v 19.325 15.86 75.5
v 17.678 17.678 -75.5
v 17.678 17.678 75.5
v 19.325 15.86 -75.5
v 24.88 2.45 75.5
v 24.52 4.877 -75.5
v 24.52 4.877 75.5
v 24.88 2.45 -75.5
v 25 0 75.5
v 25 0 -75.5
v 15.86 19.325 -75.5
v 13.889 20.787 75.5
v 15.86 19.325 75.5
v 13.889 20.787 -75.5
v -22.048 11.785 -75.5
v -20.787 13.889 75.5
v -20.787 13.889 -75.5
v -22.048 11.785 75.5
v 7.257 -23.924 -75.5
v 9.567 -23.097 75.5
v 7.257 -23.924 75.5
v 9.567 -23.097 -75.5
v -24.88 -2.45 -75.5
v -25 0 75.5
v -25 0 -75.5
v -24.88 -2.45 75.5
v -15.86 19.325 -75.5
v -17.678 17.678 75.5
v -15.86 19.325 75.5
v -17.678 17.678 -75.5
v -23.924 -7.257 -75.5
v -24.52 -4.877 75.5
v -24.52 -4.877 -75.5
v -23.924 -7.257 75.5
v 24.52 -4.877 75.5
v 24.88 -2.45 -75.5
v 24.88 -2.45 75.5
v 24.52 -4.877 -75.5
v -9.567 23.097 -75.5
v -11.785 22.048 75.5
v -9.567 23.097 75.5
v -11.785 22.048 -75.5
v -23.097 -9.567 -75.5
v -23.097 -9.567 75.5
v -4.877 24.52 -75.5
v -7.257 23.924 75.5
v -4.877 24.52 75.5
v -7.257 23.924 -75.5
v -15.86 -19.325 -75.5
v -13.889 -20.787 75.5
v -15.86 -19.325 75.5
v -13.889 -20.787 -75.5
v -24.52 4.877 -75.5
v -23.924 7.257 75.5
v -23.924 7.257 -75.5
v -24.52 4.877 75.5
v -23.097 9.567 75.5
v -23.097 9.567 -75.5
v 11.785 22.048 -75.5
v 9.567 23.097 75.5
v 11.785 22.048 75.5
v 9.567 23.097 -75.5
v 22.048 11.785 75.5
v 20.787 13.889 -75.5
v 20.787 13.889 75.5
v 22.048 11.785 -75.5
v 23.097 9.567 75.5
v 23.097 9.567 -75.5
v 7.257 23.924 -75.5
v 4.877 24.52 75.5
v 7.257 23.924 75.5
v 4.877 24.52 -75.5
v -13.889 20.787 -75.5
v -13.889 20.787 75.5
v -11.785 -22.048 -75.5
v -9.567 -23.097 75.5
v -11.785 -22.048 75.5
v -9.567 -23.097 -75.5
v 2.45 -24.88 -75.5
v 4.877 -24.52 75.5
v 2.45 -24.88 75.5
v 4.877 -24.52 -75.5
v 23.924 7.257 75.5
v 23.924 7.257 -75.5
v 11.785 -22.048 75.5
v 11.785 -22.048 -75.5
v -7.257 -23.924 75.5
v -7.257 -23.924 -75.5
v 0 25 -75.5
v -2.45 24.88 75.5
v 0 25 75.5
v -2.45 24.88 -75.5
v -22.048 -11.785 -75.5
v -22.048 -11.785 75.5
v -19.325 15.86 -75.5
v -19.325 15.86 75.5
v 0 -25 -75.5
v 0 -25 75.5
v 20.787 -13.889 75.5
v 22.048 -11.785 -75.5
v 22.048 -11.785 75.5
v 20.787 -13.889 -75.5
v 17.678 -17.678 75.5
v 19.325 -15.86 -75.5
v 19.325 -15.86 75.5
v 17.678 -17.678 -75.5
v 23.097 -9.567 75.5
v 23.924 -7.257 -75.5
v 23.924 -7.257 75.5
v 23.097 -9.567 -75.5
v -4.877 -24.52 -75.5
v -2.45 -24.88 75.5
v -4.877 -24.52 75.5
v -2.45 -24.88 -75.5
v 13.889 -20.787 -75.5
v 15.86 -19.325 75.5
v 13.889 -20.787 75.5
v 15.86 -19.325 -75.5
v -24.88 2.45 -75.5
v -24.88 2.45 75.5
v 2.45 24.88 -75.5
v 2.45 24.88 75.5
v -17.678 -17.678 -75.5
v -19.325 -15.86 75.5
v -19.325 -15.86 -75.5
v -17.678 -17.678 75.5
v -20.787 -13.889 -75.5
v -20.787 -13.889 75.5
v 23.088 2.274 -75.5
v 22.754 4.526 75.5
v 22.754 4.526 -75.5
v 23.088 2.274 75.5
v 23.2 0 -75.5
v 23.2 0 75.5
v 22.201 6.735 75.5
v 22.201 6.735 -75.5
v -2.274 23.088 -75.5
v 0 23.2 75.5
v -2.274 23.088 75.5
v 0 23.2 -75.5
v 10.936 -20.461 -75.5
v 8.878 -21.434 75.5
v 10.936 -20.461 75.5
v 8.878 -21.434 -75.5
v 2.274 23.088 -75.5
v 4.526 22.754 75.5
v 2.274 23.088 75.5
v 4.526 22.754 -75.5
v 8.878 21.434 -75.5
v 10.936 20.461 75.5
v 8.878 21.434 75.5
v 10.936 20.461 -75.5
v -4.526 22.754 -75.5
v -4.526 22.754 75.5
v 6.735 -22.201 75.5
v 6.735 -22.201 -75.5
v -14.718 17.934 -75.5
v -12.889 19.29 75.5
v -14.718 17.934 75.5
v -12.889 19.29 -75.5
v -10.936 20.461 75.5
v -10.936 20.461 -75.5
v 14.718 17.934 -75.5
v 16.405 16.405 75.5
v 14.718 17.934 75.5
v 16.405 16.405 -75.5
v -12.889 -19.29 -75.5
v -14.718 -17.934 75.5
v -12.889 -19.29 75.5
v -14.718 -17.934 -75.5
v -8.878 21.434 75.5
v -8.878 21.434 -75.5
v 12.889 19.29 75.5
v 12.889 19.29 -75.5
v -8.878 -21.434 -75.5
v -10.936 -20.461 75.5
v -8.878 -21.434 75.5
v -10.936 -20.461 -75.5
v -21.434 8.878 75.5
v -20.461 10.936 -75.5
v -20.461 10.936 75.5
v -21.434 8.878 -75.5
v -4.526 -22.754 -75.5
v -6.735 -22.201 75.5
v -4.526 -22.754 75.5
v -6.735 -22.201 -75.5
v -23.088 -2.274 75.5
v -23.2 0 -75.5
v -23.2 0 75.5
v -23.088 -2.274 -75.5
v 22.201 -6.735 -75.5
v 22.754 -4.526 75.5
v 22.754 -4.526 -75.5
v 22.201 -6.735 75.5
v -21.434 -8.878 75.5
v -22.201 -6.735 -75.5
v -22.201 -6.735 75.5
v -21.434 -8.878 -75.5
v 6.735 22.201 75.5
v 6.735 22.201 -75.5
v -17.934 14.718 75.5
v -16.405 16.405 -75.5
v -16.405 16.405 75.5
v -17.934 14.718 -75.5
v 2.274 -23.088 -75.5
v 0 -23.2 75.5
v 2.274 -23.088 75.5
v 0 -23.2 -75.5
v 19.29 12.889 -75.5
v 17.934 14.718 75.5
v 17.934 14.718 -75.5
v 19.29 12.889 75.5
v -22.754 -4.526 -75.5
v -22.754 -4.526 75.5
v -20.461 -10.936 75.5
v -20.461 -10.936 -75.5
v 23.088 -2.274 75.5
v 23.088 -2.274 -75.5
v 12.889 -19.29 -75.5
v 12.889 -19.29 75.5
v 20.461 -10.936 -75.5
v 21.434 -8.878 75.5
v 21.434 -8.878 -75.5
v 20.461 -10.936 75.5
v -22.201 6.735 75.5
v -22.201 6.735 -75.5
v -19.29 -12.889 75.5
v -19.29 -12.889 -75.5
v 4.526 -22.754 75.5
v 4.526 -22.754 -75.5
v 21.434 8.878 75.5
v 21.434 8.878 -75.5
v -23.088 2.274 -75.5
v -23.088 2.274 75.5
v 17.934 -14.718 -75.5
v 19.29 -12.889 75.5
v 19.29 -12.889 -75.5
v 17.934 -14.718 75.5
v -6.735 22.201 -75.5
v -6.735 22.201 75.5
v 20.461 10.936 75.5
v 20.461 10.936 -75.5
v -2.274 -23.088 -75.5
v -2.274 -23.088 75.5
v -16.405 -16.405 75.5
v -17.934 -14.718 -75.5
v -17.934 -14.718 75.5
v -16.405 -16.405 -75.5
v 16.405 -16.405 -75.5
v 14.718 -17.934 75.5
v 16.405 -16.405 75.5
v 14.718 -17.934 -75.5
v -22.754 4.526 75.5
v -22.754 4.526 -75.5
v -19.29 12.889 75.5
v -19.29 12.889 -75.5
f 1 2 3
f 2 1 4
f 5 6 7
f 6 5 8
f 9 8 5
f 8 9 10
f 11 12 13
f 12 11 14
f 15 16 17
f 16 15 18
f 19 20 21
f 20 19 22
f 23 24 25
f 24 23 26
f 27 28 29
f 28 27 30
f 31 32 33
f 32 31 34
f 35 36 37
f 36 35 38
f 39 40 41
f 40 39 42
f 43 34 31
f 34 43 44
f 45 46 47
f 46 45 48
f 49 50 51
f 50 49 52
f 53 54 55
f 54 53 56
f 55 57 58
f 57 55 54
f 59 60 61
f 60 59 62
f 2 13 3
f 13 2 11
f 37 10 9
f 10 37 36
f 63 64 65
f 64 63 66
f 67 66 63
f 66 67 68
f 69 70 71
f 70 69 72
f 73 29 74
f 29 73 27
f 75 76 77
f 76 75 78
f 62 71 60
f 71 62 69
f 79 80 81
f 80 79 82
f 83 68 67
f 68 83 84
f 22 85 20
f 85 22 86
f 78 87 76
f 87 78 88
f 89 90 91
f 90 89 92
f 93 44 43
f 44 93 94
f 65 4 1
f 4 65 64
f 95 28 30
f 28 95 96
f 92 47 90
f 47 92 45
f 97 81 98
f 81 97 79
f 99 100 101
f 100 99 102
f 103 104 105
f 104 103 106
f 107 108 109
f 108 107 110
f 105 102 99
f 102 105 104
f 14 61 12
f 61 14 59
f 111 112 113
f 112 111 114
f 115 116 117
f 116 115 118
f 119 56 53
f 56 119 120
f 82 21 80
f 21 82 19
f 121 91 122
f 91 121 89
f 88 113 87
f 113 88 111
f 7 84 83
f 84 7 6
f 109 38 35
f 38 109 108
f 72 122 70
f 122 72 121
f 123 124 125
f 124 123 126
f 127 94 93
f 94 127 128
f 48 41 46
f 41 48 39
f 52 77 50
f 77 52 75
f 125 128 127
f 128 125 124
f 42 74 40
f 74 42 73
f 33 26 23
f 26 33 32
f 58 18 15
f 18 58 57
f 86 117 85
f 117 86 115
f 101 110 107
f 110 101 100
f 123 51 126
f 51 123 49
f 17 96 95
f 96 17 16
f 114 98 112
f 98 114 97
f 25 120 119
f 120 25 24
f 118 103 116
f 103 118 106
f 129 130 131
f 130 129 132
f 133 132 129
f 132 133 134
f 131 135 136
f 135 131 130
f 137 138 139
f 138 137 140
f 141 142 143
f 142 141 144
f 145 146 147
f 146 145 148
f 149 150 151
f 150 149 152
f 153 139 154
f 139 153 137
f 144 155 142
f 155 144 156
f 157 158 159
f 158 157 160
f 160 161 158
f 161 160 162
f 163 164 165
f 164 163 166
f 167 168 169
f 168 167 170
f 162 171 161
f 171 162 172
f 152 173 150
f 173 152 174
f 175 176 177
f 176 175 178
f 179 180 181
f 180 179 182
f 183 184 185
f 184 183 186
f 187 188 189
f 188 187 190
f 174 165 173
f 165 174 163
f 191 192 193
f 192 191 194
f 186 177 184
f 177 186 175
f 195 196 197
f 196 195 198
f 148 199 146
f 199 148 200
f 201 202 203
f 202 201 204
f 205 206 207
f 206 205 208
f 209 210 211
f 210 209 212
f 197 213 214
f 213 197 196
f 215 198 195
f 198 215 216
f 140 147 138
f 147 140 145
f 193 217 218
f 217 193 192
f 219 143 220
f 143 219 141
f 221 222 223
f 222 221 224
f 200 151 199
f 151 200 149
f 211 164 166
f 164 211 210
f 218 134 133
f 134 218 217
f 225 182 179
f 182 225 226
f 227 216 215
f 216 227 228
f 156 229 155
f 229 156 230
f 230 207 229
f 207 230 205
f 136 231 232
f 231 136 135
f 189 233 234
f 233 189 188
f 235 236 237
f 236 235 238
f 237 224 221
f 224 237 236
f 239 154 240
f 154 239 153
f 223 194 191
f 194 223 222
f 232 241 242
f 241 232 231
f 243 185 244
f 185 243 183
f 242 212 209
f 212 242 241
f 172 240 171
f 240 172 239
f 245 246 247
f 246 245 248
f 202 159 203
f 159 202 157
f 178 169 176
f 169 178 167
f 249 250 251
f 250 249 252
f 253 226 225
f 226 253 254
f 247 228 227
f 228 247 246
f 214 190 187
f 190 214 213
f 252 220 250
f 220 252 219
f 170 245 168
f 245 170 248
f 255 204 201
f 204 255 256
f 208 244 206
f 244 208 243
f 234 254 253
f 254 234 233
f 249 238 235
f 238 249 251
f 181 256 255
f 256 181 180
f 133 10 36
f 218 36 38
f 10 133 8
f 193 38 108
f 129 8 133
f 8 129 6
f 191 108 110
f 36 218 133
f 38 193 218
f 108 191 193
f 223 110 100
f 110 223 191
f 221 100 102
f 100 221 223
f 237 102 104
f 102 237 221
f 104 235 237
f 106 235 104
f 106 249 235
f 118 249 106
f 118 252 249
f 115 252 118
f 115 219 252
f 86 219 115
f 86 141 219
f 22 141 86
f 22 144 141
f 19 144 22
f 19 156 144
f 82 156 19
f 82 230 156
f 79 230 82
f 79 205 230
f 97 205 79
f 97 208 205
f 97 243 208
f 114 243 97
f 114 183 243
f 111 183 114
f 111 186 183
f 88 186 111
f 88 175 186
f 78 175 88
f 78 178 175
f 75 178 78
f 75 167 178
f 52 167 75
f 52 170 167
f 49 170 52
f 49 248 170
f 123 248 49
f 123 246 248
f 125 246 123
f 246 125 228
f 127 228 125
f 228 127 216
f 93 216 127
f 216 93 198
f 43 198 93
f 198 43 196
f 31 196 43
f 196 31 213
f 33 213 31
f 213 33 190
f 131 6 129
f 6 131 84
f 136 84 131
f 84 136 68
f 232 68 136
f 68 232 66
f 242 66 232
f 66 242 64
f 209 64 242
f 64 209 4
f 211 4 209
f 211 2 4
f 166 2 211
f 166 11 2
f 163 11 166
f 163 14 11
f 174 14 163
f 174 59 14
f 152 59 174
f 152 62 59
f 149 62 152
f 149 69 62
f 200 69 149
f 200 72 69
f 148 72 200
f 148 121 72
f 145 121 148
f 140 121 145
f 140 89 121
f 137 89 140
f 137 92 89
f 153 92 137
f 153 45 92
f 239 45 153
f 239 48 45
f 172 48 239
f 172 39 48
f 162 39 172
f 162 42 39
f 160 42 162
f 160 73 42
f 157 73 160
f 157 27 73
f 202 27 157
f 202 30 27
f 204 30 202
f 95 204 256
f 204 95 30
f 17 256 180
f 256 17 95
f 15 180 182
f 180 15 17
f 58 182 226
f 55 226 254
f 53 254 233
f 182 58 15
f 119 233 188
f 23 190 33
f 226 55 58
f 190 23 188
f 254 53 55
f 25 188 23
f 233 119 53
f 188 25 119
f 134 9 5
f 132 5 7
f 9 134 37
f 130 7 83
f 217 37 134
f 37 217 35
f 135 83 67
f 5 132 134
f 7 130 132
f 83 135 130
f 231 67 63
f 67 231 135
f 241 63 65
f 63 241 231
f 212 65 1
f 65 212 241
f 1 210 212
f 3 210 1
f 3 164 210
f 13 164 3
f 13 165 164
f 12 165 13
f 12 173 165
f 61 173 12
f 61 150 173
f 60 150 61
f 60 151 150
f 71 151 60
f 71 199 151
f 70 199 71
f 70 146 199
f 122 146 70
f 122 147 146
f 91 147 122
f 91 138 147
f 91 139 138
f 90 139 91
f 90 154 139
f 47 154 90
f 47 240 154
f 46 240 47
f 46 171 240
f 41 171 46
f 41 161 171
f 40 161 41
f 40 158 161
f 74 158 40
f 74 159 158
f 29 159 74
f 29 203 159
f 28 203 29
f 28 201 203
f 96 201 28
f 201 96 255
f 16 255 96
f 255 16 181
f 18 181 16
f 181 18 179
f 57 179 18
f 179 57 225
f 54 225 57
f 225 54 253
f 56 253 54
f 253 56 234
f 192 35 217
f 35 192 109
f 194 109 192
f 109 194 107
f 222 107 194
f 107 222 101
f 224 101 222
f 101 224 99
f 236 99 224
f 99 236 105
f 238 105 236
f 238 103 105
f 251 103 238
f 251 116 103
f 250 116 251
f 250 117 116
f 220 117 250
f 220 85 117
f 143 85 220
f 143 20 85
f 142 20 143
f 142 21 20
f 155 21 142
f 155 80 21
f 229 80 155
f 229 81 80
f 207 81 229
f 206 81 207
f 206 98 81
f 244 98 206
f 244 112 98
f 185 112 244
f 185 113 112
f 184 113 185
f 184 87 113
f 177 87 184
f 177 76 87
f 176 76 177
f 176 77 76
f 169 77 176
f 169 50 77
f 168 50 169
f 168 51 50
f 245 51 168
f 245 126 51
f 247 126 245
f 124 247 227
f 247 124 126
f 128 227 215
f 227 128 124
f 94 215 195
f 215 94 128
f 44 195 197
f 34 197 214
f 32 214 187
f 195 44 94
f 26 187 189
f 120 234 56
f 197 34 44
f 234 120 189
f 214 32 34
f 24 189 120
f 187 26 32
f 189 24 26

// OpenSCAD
// Parameters
nominal_size_label = 50; //[50:50:1]
length_mm = 150; //[75:300:1]
ht50_outer_diameter = 50; //[45:60:0.1]
ht50_wall_thickness = 1.8; //[1:4:0.1]
connect_overlap = 1; //[0.5:2:0.1]

// Module for HT Pipe
module ht_pipe() {
  color([0.85, 0.85, 0.8]) { // Off-white for PVC
    // Outer cylinder
    difference() {
      cylinder(r=ht50_outer_diameter/2, h=length_mm, center=true, $fn=64);
      // Inner cylinder to create hollow tube
      translate([0, 0, 0])
        cylinder(r=ht50_outer_diameter/2 - ht50_wall_thickness, h=length_mm, center=true, $fn=64);
    }
    
    // End faces
    for (z = [-length_mm/2, length_mm/2]) {
      translate([0, 0, z]) {
        difference() {
          // Outer reference
          cylinder(r=ht50_outer_diameter/2, h=connect_overlap, center=true, $fn=64);
          // Inner reference
          cylinder(r=ht50_outer_diameter/2 - ht50_wall_thickness, h=connect_overlap, center=true, $fn=64);
        }
      }
    }
  }
}

// Assembly
module assembly() {
  ht_pipe();
}

assembly();
